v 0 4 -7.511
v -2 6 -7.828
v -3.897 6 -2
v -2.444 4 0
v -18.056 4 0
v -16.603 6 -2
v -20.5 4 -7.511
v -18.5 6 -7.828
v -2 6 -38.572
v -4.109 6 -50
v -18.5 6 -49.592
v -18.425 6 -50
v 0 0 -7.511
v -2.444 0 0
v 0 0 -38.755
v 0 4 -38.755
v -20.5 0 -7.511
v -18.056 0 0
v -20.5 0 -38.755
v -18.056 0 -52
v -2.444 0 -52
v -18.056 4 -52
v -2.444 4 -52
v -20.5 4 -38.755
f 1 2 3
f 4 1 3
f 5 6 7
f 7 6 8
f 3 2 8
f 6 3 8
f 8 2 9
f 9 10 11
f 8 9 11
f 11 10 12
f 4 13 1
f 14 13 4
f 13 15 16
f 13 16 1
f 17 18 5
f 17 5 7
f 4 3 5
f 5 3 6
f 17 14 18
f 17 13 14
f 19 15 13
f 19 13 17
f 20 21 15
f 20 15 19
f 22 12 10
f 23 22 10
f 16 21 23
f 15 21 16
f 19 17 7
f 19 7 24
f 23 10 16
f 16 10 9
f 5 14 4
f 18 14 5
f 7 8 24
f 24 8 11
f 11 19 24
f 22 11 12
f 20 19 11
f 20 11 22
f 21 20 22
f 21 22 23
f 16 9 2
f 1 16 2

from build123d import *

# Parameters (mm, degrees)
EXTRUDE_1_DEPTH = 6
CHAMFER_1_SIZE  = 2


with BuildPart() as part:
    # Эскиз1 → Бобышка-Вытянуть1 (new body)
    with BuildSketch(Plane(origin=(0, 0, 0), x_dir=(1, 0, 0), z_dir=(0, 1, 0))):
        Polygon((-2.444490443, 0), (-18.055509557, 0), (-20.5, 7.510567106), (-20.5, 38.754932475), (-18.055509557, 52), (-2.444490443, 52), (0, 38.754932475), (0, 7.510567106), align=None)
    extrude(amount=EXTRUDE_1_DEPTH)

    # Фаска1
    chamfer_1_edges = [part.edges().sort_by_distance(p)[0] for p in [
        (-19.277754779, 6, -3.755283553),
        (-10.25, 6, 0),
        (-1.222245221, 6, -3.755283553),
        (0, 6, -23.13274979),
        (-1.222245221, 6, -45.377466237),
        (-10.25, 6, -52),
        (-20.5, 6, -23.13274979),
    ]]
    chamfer(chamfer_1_edges, length=CHAMFER_1_SIZE)


solid = part.part
